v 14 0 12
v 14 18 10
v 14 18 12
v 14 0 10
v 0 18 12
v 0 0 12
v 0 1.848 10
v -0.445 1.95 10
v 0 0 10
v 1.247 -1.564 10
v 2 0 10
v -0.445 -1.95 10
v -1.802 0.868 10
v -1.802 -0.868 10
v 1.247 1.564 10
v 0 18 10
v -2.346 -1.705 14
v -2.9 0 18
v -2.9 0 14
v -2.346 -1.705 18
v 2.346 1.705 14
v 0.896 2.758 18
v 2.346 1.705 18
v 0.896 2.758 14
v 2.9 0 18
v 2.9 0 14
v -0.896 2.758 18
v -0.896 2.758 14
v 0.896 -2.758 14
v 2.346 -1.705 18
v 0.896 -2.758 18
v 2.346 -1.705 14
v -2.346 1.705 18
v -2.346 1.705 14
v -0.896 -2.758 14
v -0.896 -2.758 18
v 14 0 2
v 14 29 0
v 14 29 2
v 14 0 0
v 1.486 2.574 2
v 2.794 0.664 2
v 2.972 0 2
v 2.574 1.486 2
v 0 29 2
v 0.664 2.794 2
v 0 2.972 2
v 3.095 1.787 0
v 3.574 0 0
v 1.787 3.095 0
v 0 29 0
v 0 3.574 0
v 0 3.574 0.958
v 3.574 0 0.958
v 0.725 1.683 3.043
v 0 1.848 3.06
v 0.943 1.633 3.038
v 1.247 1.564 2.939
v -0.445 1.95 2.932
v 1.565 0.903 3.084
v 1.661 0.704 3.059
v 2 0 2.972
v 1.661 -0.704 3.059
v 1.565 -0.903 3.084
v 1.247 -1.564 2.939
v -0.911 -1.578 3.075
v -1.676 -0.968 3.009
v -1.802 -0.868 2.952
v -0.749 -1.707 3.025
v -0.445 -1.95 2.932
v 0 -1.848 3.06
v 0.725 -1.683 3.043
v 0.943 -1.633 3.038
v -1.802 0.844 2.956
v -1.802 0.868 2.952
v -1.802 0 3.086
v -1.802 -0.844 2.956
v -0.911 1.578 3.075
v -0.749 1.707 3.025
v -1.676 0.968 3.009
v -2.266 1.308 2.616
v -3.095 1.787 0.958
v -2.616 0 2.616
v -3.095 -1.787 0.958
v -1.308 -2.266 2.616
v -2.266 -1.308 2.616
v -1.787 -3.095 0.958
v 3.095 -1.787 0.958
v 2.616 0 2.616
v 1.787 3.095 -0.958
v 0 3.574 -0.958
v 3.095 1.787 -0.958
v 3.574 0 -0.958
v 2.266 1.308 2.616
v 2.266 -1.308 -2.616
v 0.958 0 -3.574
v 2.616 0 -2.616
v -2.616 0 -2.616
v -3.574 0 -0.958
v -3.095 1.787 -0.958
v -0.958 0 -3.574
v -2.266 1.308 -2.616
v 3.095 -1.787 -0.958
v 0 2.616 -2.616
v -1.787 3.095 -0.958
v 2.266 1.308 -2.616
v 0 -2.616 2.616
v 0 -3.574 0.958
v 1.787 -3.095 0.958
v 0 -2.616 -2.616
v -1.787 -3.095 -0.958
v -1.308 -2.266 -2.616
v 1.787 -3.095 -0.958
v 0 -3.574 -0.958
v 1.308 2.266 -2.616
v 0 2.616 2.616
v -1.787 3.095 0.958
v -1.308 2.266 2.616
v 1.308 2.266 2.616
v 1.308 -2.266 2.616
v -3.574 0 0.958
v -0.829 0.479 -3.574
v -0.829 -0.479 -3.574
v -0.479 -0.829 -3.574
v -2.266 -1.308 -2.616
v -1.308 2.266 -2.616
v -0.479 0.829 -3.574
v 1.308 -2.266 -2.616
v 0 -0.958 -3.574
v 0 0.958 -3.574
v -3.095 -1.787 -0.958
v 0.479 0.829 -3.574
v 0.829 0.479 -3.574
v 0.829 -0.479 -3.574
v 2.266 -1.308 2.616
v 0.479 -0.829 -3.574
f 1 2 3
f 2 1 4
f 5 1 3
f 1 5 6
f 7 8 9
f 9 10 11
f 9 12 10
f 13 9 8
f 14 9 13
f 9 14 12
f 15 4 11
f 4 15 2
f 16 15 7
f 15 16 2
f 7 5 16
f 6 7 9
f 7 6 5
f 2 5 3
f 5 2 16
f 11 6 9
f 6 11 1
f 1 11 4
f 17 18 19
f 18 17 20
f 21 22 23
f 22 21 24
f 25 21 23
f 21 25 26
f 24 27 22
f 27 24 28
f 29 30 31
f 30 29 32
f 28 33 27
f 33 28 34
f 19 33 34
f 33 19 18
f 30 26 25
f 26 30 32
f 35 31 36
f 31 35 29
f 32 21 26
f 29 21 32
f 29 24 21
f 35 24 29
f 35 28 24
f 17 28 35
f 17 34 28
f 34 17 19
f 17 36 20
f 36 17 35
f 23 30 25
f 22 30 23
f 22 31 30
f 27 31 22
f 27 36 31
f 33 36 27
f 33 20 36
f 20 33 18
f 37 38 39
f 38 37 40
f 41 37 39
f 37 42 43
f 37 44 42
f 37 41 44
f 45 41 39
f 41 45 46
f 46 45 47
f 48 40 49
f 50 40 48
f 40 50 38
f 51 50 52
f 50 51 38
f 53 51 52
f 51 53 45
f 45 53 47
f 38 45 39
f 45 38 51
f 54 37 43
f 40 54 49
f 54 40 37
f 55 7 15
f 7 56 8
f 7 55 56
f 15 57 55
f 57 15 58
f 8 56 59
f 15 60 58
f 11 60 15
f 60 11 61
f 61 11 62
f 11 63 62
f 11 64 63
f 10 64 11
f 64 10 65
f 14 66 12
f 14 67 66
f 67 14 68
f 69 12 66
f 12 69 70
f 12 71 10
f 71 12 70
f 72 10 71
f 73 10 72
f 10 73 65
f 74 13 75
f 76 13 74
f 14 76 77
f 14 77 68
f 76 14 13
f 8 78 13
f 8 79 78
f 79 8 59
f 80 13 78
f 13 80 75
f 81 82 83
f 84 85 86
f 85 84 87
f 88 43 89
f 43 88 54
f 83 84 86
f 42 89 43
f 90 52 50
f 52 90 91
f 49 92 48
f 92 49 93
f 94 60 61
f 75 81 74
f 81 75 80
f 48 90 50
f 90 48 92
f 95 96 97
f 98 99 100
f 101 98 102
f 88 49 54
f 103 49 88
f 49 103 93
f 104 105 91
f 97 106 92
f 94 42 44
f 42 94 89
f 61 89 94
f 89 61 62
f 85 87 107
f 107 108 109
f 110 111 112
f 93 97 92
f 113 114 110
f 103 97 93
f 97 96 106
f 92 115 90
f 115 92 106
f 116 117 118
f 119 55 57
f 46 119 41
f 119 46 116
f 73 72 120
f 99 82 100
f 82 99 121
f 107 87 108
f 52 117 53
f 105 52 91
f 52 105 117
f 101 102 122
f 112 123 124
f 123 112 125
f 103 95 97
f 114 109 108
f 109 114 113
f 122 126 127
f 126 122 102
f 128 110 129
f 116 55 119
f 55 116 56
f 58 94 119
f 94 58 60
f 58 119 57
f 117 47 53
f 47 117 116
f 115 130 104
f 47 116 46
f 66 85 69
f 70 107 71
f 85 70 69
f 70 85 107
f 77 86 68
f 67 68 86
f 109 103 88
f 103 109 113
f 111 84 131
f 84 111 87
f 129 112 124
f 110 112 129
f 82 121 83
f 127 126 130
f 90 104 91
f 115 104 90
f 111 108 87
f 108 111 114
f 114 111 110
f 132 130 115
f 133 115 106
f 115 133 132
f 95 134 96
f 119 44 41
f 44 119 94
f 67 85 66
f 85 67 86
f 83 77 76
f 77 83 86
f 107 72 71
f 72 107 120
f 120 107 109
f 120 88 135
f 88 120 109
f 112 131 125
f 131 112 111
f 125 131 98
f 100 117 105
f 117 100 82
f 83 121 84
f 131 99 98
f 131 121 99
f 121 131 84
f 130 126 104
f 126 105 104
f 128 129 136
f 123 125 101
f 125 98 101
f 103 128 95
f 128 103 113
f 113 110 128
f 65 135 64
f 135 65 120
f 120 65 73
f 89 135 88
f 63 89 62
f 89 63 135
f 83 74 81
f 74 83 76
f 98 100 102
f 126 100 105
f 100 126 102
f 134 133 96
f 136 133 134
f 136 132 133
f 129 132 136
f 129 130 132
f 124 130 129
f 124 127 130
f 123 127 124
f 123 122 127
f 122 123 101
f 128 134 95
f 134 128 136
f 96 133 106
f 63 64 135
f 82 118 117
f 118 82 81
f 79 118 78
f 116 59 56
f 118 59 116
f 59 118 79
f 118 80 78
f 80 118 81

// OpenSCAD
cube(size=[14,29,2],center=false);
cylinder(r=2,h=10);
sphere(r=3.7);
cube(size=[14,29,2],center=false);



//cool
translate([0,0,10]){
cube(size=[14,18,2],center=false);
translate([0,0,4]) cylinder(h=4,r=2.9,center=false);
}
